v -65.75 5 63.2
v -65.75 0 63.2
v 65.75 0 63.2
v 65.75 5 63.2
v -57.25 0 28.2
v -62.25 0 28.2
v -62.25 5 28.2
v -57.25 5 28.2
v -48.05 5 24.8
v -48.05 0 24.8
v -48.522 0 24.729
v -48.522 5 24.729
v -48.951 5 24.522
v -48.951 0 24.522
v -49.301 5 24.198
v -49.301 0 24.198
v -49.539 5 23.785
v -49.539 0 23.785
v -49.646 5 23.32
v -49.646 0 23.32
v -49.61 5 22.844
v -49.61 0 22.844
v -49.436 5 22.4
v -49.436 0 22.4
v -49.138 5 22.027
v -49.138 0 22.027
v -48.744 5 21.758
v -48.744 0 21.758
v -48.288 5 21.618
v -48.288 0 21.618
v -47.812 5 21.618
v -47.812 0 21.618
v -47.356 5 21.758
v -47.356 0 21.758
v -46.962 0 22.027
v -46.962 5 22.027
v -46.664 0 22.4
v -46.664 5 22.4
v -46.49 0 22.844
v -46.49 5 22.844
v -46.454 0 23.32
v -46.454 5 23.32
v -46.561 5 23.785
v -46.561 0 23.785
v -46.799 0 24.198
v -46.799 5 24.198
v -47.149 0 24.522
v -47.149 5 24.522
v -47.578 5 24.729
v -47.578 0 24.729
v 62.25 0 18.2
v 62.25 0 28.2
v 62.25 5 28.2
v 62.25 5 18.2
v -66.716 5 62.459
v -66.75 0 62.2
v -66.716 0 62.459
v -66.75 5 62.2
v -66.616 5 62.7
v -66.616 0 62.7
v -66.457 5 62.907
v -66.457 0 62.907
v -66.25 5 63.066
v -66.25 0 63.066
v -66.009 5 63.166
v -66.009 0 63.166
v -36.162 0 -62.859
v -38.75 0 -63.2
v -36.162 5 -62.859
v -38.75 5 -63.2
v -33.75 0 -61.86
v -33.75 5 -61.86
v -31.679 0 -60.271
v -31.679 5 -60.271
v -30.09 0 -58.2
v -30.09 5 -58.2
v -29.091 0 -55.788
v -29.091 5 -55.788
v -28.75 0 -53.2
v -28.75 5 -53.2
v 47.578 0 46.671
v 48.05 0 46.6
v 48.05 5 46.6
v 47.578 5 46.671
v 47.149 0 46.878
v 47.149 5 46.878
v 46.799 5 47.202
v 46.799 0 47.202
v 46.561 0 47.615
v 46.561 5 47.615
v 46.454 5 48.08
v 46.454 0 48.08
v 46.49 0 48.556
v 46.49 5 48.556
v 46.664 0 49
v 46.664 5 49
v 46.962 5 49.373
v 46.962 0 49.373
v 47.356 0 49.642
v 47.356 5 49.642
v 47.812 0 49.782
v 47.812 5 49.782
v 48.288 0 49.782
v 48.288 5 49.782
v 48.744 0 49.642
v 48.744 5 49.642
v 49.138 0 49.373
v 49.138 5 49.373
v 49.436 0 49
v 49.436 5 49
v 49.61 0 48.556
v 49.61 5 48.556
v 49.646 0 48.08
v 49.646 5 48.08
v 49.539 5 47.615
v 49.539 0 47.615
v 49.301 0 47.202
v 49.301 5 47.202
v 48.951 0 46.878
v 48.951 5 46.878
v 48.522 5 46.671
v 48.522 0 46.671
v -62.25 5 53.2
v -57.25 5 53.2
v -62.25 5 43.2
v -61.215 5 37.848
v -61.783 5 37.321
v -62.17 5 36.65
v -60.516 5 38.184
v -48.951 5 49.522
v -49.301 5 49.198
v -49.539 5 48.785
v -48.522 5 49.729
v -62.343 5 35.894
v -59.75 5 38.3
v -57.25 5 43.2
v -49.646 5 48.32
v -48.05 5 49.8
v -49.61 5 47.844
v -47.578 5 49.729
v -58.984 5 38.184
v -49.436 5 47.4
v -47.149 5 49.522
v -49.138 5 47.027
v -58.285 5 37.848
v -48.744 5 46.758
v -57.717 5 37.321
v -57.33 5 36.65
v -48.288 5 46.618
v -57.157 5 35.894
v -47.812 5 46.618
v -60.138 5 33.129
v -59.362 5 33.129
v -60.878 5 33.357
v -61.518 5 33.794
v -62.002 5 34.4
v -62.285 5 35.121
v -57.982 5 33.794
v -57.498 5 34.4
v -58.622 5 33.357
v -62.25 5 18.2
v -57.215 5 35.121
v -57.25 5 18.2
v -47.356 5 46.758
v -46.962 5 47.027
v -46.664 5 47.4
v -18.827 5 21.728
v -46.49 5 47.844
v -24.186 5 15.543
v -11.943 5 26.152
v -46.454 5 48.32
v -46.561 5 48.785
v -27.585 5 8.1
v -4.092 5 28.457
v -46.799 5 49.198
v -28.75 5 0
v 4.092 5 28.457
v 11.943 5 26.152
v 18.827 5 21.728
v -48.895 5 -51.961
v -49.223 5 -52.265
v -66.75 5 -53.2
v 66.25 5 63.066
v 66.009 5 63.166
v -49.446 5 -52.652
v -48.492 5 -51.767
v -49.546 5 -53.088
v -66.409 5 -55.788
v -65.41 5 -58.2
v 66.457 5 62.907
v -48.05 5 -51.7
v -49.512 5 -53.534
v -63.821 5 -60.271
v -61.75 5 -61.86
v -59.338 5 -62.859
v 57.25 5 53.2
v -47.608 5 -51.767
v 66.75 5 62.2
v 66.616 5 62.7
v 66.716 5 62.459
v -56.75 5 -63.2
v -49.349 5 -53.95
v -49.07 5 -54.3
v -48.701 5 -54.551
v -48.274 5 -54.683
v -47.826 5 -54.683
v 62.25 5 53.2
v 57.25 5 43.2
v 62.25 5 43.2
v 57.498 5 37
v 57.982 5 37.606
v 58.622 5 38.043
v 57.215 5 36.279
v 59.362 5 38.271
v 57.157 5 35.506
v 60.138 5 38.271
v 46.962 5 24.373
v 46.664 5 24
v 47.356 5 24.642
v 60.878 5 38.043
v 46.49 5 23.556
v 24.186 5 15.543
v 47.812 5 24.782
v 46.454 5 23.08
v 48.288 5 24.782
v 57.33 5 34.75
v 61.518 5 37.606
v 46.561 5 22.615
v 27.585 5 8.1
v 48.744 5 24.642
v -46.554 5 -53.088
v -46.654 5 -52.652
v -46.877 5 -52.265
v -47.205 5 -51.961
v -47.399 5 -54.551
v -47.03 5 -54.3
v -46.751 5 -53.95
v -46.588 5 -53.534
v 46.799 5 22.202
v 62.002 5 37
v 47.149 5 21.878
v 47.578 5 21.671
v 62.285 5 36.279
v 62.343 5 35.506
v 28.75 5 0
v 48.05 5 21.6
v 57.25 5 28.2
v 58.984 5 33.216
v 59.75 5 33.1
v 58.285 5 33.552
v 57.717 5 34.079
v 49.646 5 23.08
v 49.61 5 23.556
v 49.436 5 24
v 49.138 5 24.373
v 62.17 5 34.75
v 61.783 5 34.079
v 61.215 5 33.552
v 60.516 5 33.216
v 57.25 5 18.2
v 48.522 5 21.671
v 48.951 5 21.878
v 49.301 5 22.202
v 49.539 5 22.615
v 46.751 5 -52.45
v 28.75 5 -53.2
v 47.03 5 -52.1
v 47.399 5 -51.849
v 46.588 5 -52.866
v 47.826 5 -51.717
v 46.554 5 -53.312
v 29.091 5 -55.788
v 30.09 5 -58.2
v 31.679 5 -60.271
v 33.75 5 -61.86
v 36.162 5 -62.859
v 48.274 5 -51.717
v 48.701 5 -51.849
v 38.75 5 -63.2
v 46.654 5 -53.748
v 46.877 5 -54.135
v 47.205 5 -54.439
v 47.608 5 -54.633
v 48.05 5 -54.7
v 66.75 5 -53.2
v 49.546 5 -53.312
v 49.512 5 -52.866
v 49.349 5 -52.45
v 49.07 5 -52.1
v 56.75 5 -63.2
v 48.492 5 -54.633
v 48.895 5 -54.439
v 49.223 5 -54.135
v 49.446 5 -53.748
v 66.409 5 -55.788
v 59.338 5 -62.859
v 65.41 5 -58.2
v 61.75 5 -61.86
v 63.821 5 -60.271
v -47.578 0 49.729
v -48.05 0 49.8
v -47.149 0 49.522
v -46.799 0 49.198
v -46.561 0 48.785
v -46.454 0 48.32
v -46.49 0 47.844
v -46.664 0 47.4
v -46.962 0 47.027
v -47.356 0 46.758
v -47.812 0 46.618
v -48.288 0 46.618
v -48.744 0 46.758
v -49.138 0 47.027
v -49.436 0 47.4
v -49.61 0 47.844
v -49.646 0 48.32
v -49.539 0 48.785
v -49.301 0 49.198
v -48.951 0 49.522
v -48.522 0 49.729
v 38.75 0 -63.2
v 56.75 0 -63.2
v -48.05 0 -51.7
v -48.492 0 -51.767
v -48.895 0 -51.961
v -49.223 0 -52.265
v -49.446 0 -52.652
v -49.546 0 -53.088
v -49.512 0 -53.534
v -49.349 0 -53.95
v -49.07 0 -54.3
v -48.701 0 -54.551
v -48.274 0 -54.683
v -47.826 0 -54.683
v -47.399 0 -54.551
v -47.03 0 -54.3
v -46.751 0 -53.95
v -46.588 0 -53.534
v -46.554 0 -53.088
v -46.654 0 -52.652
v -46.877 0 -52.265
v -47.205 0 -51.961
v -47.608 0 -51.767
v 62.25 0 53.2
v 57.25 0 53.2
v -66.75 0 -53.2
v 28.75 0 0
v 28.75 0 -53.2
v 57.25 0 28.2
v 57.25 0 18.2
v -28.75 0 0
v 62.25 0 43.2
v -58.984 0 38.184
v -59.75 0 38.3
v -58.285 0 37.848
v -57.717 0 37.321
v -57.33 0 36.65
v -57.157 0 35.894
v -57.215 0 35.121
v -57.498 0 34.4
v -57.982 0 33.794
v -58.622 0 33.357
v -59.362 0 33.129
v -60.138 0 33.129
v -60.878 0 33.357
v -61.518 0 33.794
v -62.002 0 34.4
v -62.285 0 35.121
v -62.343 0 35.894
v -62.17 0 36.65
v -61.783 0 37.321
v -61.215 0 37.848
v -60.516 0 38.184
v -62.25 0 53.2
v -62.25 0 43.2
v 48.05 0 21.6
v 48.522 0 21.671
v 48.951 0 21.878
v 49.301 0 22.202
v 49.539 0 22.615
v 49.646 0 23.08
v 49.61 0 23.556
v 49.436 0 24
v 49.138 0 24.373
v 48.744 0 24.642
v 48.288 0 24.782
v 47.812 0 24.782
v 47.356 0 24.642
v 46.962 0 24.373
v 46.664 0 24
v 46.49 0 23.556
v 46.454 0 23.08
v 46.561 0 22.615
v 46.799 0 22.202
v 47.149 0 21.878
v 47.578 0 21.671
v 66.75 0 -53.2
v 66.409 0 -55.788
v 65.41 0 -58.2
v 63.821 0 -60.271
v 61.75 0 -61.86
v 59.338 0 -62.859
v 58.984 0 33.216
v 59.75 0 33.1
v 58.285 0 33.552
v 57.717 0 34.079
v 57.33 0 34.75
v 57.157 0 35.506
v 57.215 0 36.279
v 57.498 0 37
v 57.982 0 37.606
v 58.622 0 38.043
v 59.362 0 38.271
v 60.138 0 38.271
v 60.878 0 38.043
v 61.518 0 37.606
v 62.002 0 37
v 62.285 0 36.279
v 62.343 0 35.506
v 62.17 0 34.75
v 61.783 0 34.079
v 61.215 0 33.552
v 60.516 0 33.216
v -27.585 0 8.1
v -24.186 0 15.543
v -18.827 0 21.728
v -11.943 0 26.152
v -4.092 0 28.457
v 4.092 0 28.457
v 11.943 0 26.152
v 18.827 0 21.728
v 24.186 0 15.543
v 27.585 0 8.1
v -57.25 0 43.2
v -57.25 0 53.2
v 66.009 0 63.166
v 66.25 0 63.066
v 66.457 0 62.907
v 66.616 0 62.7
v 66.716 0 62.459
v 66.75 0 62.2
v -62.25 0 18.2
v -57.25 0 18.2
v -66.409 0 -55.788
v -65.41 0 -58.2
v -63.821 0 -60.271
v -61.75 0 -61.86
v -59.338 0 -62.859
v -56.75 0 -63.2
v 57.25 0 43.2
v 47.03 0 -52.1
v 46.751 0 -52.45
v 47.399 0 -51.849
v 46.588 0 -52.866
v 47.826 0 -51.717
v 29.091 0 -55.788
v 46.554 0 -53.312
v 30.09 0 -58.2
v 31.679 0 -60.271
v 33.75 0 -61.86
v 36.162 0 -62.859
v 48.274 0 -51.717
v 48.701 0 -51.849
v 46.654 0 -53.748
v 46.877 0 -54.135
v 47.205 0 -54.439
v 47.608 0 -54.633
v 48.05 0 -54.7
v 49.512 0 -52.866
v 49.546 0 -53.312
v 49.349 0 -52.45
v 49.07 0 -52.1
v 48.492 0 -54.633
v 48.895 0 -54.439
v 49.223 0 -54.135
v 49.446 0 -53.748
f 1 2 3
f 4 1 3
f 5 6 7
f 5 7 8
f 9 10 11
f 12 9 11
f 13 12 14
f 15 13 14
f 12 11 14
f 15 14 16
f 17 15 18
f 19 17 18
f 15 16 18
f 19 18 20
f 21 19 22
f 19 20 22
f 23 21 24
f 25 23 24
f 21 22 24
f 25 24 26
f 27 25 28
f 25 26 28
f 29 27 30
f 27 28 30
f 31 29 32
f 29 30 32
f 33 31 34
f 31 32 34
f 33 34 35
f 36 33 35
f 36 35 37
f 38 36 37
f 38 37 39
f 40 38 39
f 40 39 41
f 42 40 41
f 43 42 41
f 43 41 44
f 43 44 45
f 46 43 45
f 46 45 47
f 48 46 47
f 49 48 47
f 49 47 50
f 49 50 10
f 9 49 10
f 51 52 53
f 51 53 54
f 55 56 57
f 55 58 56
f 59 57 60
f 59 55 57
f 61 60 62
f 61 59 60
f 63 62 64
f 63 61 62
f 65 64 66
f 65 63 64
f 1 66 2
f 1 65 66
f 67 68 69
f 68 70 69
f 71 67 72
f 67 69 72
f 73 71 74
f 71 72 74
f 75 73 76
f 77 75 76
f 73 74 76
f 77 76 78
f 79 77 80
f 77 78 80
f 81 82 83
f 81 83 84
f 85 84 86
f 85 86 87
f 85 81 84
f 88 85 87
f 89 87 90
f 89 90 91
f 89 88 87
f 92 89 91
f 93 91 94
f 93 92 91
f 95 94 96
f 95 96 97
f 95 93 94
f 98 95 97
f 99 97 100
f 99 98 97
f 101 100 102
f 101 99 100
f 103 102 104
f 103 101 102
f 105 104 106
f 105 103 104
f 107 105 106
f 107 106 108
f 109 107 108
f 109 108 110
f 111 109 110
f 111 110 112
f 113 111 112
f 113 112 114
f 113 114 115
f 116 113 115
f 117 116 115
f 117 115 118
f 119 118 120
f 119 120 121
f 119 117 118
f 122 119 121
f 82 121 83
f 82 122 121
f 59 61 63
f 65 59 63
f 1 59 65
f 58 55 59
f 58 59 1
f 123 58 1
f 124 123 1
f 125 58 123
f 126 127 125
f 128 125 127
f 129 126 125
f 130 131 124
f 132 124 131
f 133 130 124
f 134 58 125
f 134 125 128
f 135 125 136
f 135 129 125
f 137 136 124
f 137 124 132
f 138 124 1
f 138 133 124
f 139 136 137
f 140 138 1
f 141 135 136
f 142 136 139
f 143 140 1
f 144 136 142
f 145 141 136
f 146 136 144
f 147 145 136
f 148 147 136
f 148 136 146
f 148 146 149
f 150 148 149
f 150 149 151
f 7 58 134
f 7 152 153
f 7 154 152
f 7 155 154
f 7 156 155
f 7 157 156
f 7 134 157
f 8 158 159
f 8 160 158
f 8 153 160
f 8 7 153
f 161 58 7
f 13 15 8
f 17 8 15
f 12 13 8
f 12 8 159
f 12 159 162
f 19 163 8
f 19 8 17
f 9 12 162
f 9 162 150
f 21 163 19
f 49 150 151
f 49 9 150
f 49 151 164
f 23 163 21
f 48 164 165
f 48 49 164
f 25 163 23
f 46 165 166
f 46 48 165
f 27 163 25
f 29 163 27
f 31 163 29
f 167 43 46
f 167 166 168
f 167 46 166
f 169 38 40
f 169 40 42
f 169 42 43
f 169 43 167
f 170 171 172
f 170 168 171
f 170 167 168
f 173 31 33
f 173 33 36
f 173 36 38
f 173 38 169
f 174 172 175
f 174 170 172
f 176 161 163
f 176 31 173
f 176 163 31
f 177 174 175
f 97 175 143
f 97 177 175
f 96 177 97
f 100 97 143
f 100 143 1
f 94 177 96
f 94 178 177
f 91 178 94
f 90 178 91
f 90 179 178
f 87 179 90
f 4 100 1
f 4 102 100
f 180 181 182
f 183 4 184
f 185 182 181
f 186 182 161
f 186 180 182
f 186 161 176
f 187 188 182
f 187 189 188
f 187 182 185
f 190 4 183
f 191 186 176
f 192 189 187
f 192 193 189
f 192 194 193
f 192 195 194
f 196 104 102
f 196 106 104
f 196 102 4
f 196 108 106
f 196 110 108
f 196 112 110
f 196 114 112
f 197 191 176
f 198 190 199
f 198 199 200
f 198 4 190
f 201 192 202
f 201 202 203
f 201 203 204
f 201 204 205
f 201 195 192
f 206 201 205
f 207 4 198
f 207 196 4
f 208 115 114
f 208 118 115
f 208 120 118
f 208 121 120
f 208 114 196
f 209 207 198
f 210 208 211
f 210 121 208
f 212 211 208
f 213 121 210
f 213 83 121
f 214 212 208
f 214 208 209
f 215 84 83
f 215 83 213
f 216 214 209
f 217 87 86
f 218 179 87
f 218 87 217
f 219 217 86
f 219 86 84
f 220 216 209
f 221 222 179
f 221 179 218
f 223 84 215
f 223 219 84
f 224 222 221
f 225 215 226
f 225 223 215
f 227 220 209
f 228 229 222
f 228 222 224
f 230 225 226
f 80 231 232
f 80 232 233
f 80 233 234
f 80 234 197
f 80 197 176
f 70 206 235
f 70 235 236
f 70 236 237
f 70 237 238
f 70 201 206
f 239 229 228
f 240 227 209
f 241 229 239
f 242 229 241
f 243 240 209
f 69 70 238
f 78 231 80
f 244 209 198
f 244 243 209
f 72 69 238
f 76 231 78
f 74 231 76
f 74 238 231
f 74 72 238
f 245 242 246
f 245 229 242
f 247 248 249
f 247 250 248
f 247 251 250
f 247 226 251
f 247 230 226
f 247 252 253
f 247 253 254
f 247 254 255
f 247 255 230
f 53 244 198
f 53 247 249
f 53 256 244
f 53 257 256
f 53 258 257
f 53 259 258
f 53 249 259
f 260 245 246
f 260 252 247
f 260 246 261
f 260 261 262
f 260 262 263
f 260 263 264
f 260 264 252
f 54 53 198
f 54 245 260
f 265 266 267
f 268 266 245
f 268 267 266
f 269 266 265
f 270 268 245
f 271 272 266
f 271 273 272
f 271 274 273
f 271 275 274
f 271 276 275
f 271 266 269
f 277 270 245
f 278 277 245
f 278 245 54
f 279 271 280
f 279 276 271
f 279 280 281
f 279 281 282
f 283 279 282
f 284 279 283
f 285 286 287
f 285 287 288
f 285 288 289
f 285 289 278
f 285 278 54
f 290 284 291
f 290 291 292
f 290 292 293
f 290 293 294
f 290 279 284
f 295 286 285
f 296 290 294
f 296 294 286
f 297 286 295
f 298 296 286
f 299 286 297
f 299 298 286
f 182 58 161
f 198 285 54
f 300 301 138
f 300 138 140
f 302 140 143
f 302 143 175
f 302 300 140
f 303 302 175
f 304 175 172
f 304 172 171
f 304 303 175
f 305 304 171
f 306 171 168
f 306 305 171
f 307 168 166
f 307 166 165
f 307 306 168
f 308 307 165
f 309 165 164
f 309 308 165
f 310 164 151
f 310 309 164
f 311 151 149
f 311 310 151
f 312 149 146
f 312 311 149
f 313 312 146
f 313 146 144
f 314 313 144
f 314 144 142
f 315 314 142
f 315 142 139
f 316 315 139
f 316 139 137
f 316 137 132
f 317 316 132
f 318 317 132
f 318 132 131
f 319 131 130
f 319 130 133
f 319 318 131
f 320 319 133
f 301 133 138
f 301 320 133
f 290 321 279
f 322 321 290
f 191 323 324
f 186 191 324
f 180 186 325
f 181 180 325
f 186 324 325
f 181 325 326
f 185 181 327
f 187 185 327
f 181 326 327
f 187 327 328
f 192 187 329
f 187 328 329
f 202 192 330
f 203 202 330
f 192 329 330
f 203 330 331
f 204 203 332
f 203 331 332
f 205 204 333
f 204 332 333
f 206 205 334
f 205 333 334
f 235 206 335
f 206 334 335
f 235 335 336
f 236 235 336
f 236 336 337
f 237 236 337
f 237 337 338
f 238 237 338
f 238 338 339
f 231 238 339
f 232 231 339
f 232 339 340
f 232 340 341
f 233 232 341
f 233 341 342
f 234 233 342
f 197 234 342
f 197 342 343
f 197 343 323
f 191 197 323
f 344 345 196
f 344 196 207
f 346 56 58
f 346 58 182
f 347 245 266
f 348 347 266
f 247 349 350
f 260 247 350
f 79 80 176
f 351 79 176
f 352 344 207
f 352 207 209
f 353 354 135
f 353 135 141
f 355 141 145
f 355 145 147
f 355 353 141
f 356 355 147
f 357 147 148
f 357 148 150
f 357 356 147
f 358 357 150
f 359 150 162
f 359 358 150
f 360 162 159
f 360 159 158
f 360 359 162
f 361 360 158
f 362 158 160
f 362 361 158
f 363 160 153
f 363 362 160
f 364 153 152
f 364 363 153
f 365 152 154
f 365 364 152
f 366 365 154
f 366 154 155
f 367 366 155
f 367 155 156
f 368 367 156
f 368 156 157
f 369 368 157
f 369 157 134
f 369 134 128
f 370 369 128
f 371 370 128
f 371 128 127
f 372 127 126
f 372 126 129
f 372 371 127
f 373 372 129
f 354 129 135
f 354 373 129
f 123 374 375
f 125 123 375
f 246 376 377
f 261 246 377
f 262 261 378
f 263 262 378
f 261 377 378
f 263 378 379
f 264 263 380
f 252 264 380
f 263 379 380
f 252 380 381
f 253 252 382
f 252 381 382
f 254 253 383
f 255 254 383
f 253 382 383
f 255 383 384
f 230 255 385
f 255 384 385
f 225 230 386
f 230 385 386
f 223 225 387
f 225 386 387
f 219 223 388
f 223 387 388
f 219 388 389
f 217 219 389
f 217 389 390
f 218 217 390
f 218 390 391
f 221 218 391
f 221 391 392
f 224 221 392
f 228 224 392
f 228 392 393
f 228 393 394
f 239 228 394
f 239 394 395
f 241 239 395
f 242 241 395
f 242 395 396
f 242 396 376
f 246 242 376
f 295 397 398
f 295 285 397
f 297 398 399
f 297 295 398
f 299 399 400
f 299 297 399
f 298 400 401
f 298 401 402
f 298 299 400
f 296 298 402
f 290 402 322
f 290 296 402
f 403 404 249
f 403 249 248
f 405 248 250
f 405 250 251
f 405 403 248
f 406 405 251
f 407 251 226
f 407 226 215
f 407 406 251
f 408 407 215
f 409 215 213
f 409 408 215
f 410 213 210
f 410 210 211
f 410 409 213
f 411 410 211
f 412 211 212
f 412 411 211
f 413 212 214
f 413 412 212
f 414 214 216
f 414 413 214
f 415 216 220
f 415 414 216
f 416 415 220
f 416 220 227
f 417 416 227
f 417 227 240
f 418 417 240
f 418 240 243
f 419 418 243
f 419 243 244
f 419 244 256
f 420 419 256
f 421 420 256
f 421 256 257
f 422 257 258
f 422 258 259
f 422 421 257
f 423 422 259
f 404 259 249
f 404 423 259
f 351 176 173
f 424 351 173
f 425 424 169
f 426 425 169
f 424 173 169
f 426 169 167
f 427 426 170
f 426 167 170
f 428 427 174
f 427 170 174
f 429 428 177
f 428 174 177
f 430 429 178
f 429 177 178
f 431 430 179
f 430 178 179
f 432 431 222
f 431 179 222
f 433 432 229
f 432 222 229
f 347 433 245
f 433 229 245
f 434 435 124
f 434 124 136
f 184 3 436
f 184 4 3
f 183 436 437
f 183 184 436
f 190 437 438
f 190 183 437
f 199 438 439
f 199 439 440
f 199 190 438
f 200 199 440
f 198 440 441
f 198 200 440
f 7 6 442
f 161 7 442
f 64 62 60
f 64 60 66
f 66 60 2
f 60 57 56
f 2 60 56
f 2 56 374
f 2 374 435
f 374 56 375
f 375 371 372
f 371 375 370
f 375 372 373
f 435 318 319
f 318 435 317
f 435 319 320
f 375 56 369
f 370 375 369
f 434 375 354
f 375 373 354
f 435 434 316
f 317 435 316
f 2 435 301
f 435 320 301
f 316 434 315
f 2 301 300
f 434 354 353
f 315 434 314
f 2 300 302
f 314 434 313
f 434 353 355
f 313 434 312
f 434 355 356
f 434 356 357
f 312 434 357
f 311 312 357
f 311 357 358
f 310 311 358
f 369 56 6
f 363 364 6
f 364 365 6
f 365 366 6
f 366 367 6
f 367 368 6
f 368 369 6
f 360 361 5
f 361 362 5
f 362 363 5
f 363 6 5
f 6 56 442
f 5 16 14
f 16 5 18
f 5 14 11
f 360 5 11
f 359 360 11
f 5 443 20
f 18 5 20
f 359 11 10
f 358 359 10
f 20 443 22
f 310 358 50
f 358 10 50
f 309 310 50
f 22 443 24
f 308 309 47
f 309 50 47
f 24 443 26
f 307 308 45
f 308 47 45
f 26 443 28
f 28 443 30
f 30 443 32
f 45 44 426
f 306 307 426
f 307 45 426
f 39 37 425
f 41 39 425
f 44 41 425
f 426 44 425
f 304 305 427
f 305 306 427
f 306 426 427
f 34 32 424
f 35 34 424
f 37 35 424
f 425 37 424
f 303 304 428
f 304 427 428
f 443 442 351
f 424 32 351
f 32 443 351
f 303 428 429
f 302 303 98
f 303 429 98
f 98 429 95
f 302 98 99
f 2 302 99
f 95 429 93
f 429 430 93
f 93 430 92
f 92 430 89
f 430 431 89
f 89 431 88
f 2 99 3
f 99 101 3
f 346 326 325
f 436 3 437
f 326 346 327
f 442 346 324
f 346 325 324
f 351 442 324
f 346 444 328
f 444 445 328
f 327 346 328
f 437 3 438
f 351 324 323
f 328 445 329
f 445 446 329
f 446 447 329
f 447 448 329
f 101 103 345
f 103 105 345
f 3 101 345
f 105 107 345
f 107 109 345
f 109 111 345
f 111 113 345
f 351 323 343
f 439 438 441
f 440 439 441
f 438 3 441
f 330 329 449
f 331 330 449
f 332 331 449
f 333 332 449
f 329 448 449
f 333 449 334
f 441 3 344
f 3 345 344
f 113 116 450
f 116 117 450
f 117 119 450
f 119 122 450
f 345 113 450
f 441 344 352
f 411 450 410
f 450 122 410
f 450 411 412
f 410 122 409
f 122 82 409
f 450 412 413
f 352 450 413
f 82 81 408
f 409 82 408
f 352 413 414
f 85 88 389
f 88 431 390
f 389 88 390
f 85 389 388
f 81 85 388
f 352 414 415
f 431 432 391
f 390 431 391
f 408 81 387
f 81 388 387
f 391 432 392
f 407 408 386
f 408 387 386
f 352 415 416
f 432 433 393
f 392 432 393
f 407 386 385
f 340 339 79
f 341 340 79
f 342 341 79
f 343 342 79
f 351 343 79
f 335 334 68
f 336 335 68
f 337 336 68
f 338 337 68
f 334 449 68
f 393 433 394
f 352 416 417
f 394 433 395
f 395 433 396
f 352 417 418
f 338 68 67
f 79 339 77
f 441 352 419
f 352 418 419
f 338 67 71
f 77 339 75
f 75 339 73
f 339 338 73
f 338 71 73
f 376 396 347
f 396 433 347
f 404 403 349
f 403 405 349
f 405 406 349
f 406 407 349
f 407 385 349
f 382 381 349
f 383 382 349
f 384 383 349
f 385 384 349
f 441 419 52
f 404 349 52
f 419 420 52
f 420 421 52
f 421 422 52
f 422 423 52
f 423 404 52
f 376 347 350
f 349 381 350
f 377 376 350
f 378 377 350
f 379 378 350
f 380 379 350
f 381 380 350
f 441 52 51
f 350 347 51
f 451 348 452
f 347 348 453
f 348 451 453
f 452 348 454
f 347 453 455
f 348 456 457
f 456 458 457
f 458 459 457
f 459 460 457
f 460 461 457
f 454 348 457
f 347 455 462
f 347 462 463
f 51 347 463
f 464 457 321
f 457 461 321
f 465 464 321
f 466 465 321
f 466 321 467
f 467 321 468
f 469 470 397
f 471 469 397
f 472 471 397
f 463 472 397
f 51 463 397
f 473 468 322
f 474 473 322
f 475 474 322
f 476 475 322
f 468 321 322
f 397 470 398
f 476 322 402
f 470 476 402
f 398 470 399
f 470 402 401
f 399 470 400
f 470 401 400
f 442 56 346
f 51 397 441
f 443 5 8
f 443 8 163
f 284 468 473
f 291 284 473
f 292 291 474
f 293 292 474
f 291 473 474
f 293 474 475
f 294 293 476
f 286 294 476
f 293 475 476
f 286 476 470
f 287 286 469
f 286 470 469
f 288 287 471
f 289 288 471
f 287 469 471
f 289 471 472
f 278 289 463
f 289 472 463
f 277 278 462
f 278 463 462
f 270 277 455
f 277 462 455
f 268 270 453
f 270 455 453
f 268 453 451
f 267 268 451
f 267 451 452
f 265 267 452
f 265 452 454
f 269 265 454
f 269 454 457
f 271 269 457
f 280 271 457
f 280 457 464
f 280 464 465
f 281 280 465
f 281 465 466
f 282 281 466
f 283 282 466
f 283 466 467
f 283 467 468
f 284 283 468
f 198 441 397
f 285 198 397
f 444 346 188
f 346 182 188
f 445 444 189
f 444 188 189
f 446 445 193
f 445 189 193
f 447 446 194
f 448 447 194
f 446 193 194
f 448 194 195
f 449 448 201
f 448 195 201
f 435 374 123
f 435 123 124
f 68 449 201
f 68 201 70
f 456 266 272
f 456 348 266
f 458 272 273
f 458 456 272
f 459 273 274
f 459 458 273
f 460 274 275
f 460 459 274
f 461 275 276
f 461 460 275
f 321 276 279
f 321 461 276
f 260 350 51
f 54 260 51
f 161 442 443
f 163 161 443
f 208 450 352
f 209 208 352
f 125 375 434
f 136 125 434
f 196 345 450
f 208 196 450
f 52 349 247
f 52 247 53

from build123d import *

# Parameters (mm, degrees)
SKETCH1_W           = 133.5
SKETCH1_H           = 126.4
SKETCH1_R           = 2.6
SKETCH1_R_2         = 1.6
SKETCH1_W_2         = 5
SKETCH1_H_2         = 10
BOSS_EXTRUDE1_DEPTH = 5
CUT_EXTRUDE2_DEPTH  = 10
FILLET2_R           = 10
CUT_EXTRUDE3_REACH  = 94.059
SKETCH5_R           = 1.6
SKETCH5_R_2         = 1.5
FILLET3_R           = 1


with BuildPart() as part:
    # Sketch1 → Boss-Extrude1 (new body)
    with BuildSketch(Plane(origin=(0, 0, 0), x_dir=(1, 0, 0), z_dir=(0, 1, 0))):
        Rectangle(SKETCH1_W, SKETCH1_H)
        with Locations(Location((-59.75, -35.7, 0), (0, 0, 270))):
            Circle(SKETCH1_R, mode=Mode.SUBTRACT)
        with Locations(Location((59.75, -35.7, 0), (0, 0, 90))):
            Circle(SKETCH1_R, mode=Mode.SUBTRACT)
        with Locations(Location((-48.05, -48.2, 0), (0, 0, 270))):
            Circle(SKETCH1_R_2, mode=Mode.SUBTRACT)
        with Locations(Location((48.05, -48.2, 0), (0, 0, 90))):
            Circle(SKETCH1_R_2, mode=Mode.SUBTRACT)
        with Locations((-59.75, -48.2)):
            Rectangle(SKETCH1_W_2, SKETCH1_H_2, mode=Mode.SUBTRACT)
        with Locations((-59.75, -23.2)):
            Rectangle(SKETCH1_W_2, SKETCH1_H_2, mode=Mode.SUBTRACT)
        with Locations((59.75, -23.2)):
            Rectangle(SKETCH1_W_2, SKETCH1_H_2, mode=Mode.SUBTRACT)
        with Locations((59.75, -48.2)):
            Rectangle(SKETCH1_W_2, SKETCH1_H_2, mode=Mode.SUBTRACT)
    extrude(amount=BOSS_EXTRUDE1_DEPTH)

    # Sketch2 → Cut-Extrude2 (cut)
    with BuildSketch(Plane(origin=(0, 5, 0), x_dir=(1, 0, 0), z_dir=(0, 1, 0))):
        with BuildLine():
            Line((-28.75, 86.678700037), (-28.75, 0))
            ThreePointArc((-28.75, 0), (0, -28.75), (28.75, 0))
            Line((28.75, 0), (28.75, 86.678700037))
            Line((28.75, 86.678700037), (-28.75, 86.678700037))
        make_face()
    extrude(amount=-CUT_EXTRUDE2_DEPTH, mode=Mode.SUBTRACT)

    # Fillet2
    fillet2_edges = [part.edges().sort_by_distance(p)[0] for p in [
        (-66.75, 2.5, -63.2),
        (66.75, 2.5, -63.2),
        (-28.75, 2.5, -63.2),
        (28.75, 2.5, -63.2),
    ]]
    fillet(fillet2_edges, radius=FILLET2_R)

    # Sketch5 → Cut-Extrude3 (cut, up to next)
    with BuildSketch(Plane.XZ, mode=Mode.PRIVATE) as cut_extrude3_sk1:
        with Locations(Location((48.05, 23.2, 0), (0, 0, 270))):
            Circle(SKETCH5_R)
    cut_extrude3_tool1 = extrude(cut_extrude3_sk1.sketch, amount=-CUT_EXTRUDE3_REACH, mode=Mode.PRIVATE) & part.part
    # Sketch5 → Cut-Extrude3 (cut, up to next)
    with BuildSketch(Plane.XZ, mode=Mode.PRIVATE) as cut_extrude3_sk2:
        with Locations(Location((48.05, -53.2, 0), (0, 0, 270))):
            Circle(SKETCH5_R_2)
    cut_extrude3_tool2 = extrude(cut_extrude3_sk2.sketch, amount=-CUT_EXTRUDE3_REACH, mode=Mode.PRIVATE) & part.part
    # Sketch5 → Cut-Extrude3 (cut, up to next)
    with BuildSketch(Plane.XZ, mode=Mode.PRIVATE) as cut_extrude3_sk3:
        with Locations(Location((-48.05, -53.2, 0), (0, 0, 90))):
            Circle(SKETCH5_R_2)
    cut_extrude3_tool3 = extrude(cut_extrude3_sk3.sketch, amount=-CUT_EXTRUDE3_REACH, mode=Mode.PRIVATE) & part.part
    # Sketch5 → Cut-Extrude3 (cut, up to next)
    with BuildSketch(Plane.XZ, mode=Mode.PRIVATE) as cut_extrude3_sk4:
        with Locations(Location((-48.05, 23.2, 0), (0, 0, 90))):
            Circle(SKETCH5_R)
    cut_extrude3_tool4 = extrude(cut_extrude3_sk4.sketch, amount=-CUT_EXTRUDE3_REACH, mode=Mode.PRIVATE) & part.part
    add(cut_extrude3_tool1.solids().sort_by_distance((48.05, 0, 23.2))[0], mode=Mode.SUBTRACT)
    add(cut_extrude3_tool2.solids().sort_by_distance((48.05, 0, -53.2))[0], mode=Mode.SUBTRACT)
    add(cut_extrude3_tool3.solids().sort_by_distance((-48.05, 0, -53.2))[0], mode=Mode.SUBTRACT)
    add(cut_extrude3_tool4.solids().sort_by_distance((-48.05, 0, 23.2))[0], mode=Mode.SUBTRACT)

    # Fillet3
    fillet3_edges = [part.edges().sort_by_distance(p)[0] for p in [
        (66.75, 2.5, 63.2),
        (-66.75, 2.5, 63.2),
    ]]
    fillet(fillet3_edges, radius=FILLET3_R)


solid = part.part
